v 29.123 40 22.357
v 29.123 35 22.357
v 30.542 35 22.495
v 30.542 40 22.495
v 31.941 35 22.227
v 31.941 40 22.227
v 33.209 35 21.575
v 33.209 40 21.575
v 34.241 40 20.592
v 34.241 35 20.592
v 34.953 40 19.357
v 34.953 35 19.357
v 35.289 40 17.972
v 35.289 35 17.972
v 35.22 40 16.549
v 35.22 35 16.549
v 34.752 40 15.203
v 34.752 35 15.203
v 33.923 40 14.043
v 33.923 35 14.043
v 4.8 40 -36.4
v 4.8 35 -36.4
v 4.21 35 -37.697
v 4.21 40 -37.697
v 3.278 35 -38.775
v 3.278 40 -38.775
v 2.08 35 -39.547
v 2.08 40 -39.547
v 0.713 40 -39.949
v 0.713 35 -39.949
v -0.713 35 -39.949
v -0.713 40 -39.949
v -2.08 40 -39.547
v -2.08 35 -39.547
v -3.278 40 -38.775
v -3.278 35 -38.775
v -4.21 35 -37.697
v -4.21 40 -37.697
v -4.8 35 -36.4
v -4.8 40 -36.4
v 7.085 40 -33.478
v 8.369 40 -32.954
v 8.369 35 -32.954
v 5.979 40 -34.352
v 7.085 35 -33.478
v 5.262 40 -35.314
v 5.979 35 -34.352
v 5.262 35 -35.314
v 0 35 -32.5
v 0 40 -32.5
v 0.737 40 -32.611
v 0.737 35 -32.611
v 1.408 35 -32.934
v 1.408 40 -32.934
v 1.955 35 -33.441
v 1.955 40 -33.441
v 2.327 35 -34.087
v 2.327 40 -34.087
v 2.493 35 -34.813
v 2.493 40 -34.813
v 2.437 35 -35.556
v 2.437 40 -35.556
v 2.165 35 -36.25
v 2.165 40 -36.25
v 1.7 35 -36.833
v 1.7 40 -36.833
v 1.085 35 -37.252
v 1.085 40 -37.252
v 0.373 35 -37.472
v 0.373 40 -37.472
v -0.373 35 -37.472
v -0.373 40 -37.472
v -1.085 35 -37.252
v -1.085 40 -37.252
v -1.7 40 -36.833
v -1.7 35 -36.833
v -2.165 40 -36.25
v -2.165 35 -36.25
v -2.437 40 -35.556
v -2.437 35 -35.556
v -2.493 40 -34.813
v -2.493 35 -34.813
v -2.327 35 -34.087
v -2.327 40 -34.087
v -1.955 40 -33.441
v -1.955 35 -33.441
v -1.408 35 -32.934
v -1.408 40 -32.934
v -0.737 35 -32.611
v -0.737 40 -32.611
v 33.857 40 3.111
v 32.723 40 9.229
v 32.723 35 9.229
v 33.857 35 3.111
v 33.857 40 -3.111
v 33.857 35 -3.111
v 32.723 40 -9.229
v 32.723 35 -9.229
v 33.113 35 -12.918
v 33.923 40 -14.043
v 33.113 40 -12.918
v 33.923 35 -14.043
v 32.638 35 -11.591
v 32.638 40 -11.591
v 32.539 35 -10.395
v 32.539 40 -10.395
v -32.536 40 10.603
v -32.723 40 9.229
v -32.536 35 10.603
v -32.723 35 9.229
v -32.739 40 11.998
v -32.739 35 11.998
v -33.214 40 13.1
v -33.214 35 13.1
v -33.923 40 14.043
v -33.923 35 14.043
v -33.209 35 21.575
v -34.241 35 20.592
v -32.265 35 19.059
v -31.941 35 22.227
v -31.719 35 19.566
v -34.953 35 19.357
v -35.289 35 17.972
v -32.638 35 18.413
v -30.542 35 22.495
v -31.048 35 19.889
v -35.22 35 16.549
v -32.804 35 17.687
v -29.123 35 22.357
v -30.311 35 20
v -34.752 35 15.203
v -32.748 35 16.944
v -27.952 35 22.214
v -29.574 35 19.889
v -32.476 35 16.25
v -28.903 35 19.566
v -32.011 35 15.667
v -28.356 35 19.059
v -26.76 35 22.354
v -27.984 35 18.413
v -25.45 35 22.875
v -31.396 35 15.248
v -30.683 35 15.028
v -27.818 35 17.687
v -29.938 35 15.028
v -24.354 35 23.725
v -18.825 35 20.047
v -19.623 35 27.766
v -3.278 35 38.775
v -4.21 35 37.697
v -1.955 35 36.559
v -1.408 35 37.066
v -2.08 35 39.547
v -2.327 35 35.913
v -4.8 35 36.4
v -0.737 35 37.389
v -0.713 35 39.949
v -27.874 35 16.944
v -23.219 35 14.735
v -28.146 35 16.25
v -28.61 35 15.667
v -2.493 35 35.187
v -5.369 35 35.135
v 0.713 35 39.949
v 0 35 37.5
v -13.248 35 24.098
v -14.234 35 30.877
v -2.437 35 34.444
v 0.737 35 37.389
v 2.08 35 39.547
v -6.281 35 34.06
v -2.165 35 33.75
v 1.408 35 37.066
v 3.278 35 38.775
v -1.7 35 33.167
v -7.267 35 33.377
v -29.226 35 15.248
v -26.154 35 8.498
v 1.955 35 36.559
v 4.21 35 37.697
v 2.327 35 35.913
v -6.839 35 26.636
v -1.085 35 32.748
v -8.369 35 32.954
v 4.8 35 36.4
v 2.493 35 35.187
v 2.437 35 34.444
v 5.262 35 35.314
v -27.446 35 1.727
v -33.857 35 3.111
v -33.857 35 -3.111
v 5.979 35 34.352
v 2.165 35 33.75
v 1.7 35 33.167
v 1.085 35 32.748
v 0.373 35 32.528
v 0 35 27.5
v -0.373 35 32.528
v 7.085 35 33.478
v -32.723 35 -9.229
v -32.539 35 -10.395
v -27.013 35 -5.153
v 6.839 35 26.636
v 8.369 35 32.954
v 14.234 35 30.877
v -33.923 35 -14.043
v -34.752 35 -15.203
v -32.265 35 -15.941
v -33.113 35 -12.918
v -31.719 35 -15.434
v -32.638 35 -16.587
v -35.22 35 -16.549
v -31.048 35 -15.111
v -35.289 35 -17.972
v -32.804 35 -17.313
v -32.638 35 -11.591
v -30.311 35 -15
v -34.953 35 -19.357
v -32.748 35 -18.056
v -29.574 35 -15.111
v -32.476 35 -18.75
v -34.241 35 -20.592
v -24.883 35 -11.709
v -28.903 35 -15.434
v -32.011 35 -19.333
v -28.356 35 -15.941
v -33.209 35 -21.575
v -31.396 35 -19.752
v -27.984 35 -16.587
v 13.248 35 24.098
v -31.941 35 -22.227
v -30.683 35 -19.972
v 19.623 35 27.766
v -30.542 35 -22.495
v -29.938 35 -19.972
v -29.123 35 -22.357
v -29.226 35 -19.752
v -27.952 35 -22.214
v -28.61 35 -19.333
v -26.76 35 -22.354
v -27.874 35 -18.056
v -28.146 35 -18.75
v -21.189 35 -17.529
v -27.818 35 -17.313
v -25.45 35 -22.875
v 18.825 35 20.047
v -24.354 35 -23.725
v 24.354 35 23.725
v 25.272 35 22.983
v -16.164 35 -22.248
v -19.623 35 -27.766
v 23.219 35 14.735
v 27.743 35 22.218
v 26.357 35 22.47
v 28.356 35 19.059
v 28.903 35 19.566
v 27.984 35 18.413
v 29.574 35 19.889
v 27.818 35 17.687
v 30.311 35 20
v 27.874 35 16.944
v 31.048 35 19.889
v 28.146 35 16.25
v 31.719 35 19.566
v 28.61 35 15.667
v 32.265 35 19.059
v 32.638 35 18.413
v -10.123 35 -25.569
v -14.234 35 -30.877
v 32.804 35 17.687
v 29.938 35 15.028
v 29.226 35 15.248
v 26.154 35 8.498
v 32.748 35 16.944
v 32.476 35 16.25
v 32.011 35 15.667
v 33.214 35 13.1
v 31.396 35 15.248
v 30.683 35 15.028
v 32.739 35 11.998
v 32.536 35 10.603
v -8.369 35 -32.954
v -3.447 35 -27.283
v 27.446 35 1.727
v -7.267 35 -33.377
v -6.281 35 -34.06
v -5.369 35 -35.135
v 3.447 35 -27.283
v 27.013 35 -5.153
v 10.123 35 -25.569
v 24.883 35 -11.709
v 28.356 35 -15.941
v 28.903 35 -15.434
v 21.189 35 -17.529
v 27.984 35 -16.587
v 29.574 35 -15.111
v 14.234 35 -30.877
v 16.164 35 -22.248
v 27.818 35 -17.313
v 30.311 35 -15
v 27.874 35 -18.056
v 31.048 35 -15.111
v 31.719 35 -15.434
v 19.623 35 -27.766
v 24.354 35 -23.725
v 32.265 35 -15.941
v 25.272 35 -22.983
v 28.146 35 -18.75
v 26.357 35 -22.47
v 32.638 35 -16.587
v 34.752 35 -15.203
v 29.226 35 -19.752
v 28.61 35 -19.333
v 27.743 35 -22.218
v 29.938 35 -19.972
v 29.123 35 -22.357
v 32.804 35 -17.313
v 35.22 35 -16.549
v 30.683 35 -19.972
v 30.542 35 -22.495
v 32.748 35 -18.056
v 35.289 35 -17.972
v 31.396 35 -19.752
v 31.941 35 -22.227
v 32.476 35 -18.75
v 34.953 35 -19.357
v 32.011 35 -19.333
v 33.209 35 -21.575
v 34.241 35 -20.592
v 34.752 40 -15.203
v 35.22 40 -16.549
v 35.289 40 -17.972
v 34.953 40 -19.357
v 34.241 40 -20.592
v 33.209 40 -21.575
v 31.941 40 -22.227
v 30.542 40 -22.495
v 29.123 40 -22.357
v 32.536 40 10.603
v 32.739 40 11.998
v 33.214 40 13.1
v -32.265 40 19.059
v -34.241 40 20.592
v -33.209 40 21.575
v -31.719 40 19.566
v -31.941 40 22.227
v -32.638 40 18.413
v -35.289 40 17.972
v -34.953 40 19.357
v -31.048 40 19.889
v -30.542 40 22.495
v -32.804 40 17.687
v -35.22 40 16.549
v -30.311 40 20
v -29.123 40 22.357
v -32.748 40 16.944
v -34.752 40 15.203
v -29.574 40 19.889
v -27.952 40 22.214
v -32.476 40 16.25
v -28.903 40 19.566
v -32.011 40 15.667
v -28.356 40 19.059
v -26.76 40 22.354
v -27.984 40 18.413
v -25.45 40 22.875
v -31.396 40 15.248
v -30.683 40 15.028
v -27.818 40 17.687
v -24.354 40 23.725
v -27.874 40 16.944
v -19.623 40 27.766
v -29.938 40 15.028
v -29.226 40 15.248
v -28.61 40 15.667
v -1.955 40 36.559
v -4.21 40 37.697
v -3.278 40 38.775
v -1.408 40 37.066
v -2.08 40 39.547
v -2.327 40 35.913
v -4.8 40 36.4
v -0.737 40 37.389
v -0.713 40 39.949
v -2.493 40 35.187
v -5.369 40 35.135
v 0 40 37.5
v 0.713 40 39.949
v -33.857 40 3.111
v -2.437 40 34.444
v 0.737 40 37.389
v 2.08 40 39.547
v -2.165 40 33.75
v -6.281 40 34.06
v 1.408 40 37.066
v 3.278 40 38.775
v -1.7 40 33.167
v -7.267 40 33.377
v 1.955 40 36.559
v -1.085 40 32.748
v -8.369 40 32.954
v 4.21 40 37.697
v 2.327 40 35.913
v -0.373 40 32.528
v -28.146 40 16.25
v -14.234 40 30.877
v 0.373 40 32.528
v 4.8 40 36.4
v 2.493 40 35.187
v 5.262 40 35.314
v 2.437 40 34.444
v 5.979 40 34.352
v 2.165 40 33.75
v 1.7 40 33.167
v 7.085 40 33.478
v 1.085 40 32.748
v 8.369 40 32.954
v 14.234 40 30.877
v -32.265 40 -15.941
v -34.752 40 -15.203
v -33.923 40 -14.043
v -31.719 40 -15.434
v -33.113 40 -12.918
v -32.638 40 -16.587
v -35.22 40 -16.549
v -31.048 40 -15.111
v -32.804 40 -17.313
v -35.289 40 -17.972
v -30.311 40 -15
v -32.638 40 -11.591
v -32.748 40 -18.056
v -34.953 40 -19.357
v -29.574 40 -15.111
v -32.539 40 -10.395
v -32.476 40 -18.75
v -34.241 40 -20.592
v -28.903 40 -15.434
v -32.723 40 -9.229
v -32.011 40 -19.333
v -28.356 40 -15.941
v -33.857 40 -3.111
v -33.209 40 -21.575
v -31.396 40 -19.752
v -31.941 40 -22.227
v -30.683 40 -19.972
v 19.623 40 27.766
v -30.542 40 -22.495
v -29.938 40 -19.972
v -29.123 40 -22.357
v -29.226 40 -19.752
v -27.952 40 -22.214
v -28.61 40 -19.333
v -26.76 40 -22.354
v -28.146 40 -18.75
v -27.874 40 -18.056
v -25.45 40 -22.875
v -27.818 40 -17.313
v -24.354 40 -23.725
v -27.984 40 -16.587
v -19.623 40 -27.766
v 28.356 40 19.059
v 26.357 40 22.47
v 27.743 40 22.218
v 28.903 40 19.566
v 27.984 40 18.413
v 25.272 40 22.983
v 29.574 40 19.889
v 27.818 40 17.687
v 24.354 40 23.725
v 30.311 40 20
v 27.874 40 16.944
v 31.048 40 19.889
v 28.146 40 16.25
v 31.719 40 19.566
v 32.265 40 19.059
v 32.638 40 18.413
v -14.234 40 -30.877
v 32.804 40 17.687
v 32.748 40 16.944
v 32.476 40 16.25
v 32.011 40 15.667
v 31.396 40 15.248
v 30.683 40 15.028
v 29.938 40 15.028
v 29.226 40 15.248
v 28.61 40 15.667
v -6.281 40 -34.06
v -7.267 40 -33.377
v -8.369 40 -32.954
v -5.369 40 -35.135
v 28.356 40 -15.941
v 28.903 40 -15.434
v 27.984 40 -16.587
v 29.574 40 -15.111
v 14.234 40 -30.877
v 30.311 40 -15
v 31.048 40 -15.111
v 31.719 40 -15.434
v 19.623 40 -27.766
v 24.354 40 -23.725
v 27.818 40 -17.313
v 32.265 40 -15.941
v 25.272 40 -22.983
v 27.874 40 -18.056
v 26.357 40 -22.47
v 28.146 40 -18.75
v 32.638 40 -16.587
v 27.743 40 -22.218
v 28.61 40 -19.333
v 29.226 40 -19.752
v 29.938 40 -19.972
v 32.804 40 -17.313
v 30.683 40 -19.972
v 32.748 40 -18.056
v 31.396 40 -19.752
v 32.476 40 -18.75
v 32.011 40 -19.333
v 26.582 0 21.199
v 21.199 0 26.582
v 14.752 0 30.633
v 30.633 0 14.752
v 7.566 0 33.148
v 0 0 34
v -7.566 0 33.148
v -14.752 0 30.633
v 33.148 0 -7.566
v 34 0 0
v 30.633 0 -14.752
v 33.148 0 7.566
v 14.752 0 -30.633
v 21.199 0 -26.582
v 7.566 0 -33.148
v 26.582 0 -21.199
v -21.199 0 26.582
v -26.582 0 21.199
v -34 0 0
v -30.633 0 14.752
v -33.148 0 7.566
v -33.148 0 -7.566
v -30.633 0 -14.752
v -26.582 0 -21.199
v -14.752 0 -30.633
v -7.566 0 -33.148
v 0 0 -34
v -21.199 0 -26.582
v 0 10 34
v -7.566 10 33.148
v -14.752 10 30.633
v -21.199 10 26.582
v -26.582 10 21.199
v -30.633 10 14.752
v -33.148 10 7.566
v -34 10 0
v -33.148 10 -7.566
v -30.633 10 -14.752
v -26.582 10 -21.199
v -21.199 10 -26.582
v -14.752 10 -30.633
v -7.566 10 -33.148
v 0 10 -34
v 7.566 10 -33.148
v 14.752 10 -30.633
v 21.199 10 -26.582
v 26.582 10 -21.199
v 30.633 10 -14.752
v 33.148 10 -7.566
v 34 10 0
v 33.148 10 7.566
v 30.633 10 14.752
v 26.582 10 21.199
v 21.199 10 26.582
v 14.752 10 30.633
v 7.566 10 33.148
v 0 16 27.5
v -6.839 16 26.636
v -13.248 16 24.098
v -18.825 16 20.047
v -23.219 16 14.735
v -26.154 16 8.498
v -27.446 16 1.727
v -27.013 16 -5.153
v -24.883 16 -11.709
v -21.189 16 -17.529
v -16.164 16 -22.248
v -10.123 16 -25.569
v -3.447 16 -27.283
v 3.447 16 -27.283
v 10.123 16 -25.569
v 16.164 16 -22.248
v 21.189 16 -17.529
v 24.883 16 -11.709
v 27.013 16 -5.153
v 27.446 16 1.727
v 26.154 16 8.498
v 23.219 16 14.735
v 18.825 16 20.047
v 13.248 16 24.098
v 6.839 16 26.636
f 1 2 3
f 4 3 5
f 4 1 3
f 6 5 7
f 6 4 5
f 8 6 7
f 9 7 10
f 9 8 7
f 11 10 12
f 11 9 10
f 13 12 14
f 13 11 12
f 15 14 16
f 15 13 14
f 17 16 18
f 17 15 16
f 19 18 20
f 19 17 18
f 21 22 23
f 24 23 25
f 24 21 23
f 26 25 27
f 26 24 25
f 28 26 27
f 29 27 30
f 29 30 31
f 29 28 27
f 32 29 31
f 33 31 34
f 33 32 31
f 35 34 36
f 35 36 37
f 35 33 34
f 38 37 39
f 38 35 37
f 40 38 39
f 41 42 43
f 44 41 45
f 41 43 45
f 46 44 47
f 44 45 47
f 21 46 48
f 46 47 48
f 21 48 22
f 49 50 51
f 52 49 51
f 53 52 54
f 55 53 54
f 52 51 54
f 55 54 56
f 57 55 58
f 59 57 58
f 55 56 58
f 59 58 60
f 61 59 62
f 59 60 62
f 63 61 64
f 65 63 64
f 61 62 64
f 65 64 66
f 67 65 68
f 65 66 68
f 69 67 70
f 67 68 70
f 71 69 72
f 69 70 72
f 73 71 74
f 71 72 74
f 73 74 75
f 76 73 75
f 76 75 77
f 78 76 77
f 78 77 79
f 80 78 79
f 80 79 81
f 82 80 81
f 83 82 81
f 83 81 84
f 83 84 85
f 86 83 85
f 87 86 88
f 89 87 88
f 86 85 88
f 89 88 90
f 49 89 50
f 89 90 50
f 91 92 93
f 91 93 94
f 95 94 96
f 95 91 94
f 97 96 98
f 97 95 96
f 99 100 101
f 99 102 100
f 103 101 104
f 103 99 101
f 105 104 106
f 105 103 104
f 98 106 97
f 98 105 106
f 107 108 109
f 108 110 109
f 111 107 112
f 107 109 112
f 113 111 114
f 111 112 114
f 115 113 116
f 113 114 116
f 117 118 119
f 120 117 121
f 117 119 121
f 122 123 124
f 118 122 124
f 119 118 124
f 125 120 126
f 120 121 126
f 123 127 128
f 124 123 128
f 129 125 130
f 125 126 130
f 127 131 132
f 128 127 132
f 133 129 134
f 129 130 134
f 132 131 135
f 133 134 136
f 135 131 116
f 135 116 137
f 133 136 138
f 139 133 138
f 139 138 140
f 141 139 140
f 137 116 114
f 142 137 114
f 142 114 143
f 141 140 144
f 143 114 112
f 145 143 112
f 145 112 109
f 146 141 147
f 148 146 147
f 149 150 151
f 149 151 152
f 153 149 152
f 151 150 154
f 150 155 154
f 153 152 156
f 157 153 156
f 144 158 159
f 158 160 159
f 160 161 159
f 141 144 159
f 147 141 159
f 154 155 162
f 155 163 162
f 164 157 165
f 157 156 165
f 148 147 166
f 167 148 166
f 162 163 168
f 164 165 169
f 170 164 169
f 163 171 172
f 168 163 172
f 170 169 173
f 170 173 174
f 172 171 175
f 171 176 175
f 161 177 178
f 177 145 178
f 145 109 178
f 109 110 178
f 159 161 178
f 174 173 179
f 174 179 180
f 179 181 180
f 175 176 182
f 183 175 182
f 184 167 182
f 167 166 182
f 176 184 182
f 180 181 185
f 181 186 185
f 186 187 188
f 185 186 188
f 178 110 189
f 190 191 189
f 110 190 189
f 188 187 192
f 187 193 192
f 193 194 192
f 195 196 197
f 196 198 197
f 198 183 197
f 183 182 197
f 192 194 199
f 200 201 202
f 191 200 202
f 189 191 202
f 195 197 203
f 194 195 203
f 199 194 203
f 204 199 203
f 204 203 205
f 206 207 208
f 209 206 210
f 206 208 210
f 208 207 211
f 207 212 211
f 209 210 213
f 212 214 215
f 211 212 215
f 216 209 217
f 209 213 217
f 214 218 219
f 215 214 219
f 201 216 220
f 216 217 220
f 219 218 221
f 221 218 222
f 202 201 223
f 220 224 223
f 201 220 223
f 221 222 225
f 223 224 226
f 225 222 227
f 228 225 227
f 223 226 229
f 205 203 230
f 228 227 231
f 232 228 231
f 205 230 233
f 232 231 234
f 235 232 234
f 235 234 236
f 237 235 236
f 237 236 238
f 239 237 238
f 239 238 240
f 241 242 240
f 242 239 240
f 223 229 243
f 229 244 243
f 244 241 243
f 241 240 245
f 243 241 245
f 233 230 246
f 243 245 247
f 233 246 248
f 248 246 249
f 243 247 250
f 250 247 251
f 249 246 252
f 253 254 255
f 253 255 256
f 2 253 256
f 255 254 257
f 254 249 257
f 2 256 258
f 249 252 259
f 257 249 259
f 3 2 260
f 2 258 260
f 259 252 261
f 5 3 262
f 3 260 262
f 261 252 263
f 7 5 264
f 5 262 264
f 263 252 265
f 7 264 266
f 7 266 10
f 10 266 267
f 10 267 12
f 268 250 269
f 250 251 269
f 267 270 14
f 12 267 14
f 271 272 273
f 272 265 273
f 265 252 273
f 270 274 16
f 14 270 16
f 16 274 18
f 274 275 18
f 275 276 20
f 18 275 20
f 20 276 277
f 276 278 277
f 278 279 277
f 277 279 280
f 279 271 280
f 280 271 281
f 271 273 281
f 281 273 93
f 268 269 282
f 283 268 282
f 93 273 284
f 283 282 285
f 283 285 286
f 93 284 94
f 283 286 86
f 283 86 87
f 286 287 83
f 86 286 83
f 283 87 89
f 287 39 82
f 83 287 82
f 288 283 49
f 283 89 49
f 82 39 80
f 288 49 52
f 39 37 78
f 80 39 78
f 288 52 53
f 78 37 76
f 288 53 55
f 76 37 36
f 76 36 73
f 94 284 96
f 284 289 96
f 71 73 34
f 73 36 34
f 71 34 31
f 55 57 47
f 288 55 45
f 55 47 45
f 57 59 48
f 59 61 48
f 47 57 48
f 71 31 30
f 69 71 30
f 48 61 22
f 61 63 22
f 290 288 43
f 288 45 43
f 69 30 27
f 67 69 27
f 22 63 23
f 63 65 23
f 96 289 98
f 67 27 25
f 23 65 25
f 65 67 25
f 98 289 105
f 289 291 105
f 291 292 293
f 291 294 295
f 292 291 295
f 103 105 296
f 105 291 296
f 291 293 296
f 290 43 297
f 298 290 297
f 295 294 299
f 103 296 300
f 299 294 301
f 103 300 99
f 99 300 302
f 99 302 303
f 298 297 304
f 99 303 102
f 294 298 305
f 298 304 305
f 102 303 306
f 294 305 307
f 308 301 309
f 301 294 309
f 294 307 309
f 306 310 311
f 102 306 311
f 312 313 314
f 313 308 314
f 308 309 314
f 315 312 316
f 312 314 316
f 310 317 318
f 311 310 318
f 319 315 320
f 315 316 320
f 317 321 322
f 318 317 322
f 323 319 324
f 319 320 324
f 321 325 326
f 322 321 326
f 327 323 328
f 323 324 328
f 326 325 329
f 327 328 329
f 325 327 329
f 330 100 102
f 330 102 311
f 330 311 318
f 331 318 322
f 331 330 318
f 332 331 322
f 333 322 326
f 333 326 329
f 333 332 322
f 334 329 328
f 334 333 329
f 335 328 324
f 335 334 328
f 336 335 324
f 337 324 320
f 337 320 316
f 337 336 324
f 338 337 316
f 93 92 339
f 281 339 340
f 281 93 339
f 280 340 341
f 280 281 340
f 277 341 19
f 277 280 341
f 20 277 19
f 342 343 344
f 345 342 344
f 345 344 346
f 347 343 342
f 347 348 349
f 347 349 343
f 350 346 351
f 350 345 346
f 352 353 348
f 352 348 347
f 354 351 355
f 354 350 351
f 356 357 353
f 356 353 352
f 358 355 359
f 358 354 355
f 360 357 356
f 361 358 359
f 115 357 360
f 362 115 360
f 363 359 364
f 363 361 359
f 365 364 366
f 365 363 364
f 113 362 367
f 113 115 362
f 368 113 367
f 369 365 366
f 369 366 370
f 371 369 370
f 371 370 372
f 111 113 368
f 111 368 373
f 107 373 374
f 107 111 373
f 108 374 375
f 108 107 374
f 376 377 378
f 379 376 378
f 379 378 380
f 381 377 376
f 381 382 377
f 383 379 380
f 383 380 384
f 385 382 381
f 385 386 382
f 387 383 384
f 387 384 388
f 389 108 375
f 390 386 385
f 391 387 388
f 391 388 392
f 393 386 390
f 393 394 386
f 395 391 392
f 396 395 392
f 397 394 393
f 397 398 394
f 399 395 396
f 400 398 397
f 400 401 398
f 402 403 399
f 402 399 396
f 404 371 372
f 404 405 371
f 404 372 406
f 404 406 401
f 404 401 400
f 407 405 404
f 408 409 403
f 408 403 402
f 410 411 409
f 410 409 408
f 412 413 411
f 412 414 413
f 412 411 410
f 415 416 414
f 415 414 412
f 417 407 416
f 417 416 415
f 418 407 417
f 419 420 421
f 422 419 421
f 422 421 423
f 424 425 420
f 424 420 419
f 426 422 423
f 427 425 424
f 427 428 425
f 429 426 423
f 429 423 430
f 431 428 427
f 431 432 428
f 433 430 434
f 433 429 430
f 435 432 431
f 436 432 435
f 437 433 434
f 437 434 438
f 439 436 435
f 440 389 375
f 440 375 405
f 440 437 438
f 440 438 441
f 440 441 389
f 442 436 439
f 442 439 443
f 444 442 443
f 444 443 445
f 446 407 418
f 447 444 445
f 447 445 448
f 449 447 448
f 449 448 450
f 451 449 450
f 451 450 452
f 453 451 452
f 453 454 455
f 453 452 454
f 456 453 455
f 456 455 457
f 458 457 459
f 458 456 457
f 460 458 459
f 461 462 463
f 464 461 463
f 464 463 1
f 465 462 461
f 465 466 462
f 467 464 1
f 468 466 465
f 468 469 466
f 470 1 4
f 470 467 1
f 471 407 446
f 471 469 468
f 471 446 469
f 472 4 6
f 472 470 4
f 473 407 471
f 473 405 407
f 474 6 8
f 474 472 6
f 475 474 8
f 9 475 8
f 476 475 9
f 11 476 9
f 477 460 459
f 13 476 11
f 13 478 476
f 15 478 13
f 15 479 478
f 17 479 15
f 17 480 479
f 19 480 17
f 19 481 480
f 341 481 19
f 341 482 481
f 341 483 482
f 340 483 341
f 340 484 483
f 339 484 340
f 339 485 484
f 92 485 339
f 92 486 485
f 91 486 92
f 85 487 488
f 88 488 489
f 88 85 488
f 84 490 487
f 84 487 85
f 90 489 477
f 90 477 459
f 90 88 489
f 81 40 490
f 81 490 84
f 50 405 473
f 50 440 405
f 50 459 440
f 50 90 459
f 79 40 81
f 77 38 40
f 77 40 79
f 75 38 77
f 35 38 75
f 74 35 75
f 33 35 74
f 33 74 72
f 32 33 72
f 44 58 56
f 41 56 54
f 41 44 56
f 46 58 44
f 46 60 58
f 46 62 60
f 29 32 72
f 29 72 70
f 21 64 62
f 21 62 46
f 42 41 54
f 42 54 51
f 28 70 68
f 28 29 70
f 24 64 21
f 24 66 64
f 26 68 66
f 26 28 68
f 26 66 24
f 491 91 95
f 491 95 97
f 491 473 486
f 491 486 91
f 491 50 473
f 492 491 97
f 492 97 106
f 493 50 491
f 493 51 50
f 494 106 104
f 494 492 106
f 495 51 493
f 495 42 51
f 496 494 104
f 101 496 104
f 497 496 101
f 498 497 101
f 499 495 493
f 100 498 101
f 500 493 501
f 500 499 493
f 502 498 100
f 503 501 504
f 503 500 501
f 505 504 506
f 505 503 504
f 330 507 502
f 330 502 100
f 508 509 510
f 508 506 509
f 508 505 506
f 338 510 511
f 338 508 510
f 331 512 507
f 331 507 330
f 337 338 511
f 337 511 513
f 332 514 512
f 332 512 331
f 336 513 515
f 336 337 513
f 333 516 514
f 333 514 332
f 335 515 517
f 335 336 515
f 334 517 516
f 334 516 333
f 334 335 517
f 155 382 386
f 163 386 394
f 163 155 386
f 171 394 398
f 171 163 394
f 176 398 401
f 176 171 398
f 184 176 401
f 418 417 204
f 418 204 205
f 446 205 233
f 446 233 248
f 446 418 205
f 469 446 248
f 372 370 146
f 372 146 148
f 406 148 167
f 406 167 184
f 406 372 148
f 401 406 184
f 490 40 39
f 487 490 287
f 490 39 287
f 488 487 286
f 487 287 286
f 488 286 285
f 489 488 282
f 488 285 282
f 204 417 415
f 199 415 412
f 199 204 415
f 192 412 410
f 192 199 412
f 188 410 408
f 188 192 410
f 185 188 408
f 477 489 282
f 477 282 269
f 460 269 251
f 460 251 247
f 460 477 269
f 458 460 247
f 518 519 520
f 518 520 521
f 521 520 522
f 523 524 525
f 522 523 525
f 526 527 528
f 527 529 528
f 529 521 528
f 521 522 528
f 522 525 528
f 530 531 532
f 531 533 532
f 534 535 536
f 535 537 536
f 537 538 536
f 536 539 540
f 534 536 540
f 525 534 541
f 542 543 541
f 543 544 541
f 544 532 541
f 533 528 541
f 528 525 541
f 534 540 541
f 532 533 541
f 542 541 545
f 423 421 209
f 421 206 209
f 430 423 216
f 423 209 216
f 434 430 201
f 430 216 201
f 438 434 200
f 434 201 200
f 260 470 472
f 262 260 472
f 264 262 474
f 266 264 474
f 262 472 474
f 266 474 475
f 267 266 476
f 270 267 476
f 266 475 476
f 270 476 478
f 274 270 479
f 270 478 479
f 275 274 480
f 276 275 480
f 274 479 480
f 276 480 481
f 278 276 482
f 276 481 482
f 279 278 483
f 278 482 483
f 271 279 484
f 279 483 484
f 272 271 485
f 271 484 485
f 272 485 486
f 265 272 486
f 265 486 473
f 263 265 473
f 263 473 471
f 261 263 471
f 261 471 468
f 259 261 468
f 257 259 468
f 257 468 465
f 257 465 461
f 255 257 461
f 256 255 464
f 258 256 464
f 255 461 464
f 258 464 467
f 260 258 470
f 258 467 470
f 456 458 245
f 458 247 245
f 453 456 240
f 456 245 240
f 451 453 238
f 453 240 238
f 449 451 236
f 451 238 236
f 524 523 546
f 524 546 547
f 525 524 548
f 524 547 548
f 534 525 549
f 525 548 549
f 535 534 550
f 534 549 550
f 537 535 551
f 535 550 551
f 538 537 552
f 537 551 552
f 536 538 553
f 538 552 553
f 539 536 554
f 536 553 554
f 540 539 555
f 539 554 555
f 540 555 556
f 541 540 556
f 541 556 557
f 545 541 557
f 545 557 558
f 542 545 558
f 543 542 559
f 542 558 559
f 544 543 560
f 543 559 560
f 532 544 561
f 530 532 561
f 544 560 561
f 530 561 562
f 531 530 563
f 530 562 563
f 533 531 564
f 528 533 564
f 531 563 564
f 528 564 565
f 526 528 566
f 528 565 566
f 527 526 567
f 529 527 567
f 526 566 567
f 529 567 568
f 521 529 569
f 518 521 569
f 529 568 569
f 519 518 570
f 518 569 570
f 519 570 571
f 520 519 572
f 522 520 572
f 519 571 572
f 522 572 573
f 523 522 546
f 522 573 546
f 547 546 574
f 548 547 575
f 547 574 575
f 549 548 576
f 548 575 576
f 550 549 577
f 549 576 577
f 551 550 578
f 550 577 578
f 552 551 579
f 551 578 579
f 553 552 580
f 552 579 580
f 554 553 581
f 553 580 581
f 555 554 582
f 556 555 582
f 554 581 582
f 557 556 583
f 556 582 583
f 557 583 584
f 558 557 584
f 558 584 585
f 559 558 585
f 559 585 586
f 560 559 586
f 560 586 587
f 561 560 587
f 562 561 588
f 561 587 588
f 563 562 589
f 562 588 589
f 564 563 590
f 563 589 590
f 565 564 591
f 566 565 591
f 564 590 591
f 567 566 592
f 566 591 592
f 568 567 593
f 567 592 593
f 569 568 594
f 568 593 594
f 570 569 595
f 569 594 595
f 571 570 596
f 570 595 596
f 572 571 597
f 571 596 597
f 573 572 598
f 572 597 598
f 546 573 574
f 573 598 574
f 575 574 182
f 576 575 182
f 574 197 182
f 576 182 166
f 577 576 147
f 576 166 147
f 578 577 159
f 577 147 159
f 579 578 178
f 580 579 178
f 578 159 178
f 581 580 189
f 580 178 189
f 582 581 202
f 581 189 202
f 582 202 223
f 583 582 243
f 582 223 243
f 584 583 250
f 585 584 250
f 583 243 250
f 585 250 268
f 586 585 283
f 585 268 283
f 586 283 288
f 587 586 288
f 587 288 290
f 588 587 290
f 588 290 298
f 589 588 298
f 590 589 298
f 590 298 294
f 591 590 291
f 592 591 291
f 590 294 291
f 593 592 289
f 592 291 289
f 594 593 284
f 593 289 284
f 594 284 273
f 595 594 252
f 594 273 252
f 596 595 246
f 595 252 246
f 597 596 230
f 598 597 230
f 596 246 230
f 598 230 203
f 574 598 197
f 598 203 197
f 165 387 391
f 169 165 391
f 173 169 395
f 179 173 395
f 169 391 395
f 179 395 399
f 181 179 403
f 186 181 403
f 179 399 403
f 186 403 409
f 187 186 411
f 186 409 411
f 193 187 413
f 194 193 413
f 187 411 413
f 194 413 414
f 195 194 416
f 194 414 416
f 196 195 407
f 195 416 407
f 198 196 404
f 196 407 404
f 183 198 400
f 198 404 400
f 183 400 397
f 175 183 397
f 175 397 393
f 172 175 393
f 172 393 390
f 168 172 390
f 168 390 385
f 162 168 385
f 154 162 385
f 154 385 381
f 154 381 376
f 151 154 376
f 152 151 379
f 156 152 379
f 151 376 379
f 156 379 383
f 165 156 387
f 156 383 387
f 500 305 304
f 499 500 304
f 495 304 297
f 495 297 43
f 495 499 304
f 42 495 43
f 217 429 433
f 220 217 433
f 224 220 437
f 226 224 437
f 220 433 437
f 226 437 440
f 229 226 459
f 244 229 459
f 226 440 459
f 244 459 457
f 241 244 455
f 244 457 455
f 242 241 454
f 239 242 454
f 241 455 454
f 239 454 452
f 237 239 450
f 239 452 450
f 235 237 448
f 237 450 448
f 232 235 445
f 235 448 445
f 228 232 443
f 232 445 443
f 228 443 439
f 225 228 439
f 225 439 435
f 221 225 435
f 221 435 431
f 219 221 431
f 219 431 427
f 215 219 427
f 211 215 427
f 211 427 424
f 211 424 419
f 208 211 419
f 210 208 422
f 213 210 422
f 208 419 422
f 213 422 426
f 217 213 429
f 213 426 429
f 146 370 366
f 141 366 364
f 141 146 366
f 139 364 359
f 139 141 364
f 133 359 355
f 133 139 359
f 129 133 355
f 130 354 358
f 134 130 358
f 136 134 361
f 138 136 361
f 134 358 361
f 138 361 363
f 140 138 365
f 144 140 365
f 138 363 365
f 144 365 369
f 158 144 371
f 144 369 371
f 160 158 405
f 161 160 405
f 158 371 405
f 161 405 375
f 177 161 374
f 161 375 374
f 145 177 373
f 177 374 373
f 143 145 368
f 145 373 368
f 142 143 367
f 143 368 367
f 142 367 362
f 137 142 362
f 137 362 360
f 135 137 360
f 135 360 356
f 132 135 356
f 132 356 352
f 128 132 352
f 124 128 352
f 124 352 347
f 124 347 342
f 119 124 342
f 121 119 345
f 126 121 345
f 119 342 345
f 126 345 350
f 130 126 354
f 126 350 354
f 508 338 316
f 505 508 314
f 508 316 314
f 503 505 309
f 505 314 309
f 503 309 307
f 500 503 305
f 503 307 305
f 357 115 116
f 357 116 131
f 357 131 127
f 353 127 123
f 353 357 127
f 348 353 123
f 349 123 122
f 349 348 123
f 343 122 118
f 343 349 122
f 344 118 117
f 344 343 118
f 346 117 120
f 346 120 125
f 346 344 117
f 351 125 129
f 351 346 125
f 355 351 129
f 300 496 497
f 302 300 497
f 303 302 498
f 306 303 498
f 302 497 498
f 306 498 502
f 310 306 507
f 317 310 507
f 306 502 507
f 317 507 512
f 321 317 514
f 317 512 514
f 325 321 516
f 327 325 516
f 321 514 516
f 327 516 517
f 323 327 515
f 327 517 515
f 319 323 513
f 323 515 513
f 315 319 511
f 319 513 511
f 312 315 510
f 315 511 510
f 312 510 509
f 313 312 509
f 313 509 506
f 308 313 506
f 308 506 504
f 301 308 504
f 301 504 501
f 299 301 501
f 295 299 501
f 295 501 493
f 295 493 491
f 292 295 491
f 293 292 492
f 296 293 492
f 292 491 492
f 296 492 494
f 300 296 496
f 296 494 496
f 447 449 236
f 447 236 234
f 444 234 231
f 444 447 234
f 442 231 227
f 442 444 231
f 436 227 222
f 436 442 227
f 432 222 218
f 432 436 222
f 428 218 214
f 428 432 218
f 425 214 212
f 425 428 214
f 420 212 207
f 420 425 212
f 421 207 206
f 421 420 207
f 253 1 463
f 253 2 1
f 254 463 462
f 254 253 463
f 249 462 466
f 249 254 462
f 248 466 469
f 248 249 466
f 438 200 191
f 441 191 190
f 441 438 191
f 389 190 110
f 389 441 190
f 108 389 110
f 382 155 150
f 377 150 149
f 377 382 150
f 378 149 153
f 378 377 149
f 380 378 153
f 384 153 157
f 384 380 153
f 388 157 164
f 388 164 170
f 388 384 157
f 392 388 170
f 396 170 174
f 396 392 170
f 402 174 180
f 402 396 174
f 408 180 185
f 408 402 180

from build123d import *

# Parameters (mm, degrees)
BOSS_EXTRUDE2_START = 5
SKETCH2_R           = 2.5
BOSS_EXTRUDE2_DEPTH = 5
FILLET1_R           = 5


with BuildPart() as part:
    # Sketch3 → Revolve1 (revolve)
    with BuildSketch(Plane.XY, mode=Mode.PRIVATE) as revolve1_sk:
        Polygon((0, 0), (-34, 0), (-34, 10), (-27.5, 16), (-27.5, 35), (0, 35), align=None)
    revolve(revolve1_sk.sketch.rotate(Axis((0, 67.276563105, 0), (0, -1, 0)), 270), axis=Axis((0, 67.276563105, 0), (0, -1, 0)))

    # Sketch2 → Boss-Extrude2 (add)
    with BuildSketch(Plane(origin=(0, 35, 0), x_dir=(1, 0, 0), z_dir=(0, 1, 0)).offset(BOSS_EXTRUDE2_START)):
        with BuildLine():
            ThreePointArc((31.556090162, 12.657534265), (34.641016151, 20), (26.739791304, 20.999608592))
            ThreePointArc((26.739791304, 20.999608592), (17, 29.444863729), (4.816298858, 33.657142857))
            ThreePointArc((4.816298858, 33.657142857), (0, 40), (-4.816298858, 33.657142857))
            ThreePointArc((-4.816298858, 33.657142857), (-17, 29.444863729), (-26.739791304, 20.999608592))
            ThreePointArc((-26.739791304, 20.999608592), (-34.641016151, 20), (-31.556090162, 12.657534265))
            ThreePointArc((-31.556090162, 12.657534265), (-34, 0), (-31.556090162, -12.657534265))
            ThreePointArc((-31.556090162, -12.657534265), (-34.641016151, -20), (-26.739791304, -20.999608592))
            ThreePointArc((-26.739791304, -20.999608592), (-17, -29.444863729), (-4.816298858, -33.657142857))
            ThreePointArc((-4.816298858, -33.657142857), (0, -40), (4.816298858, -33.657142857))
            ThreePointArc((4.816298858, -33.657142857), (17, -29.444863729), (26.739791304, -20.999608592))
            ThreePointArc((26.739791304, -20.999608592), (34.641016151, -20), (31.556090162, -12.657534265))
            ThreePointArc((31.556090162, -12.657534265), (34, 0), (31.556090162, 12.657534265))
        make_face()
        with Locations(Location((-30.310889132, -17.5, 0), (0, 0, 270))):
            Circle(SKETCH2_R, mode=Mode.SUBTRACT)
        with Locations(Location((-30.310889132, 17.5, 0), (0, 0, 270))):
            Circle(SKETCH2_R, mode=Mode.SUBTRACT)
        with Locations(Location((0, -35, 0), (0, 0, 270))):
            Circle(SKETCH2_R, mode=Mode.SUBTRACT)
        with Locations(Location((0, 35, 0), (0, 0, 270))):
            Circle(SKETCH2_R, mode=Mode.SUBTRACT)
        with Locations(Location((30.310889132, -17.5, 0), (0, 0, 270))):
            Circle(SKETCH2_R, mode=Mode.SUBTRACT)
        with Locations(Location((30.310889132, 17.5, 0), (0, 0, 270))):
            Circle(SKETCH2_R, mode=Mode.SUBTRACT)
    extrude(amount=-BOSS_EXTRUDE2_DEPTH)

    # Fillet1
    fillet1_edges = [part.edges().sort_by_distance(p)[0] for p in [
        (-4.816298858, 37.5, 33.657142857),
        (4.816298858, 37.5, 33.657142857),
        (26.739791304, 37.5, 20.999608592),
        (31.556090162, 37.5, 12.657534265),
        (31.556090162, 37.5, -12.657534265),
        (26.739791304, 37.5, -20.999608592),
        (4.816298858, 37.5, -33.657142857),
        (-4.816298858, 37.5, -33.657142857),
        (-26.739791304, 37.5, -20.999608592),
        (-31.556090162, 37.5, -12.657534265),
        (-31.556090162, 37.5, 12.657534265),
        (-26.739791304, 37.5, 20.999608592),
    ]]
    fillet(fillet1_edges, radius=FILLET1_R)


solid = part.part
